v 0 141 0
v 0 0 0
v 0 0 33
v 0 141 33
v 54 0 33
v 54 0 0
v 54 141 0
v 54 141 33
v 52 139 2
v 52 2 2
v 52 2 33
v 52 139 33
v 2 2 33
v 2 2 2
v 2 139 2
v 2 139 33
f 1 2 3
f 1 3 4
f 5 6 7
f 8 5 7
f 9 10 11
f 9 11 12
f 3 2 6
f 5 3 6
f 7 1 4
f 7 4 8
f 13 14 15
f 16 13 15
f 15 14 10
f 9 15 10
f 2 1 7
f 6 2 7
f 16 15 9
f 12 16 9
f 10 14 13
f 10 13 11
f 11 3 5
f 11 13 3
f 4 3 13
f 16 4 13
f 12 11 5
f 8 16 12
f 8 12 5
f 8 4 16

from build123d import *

# Parameters (mm, degrees)
F0_W     = 54
F0_H     = 141
F0_W_2   = 50
F0_H_2   = 137
F1_DEPTH = 33
F2_W     = 54
F2_H     = 2
F3_DEPTH = 141


# Not quite as in the source:
# - the program builds the solid bodies; features that only make, move or delete a surface that nothing else refers to are left out


with BuildPart() as f1:
    # F0 (on Top) → F1 (new body)
    with BuildSketch(Plane.XY):
        with Locations((27, 70.5)):
            Rectangle(F0_W, F0_H)
        with Locations((27, 70.5)):
            Rectangle(F0_W_2, F0_H_2, mode=Mode.SUBTRACT)
    extrude(amount=F1_DEPTH)

    # F2 (on face) → F3 (join)
    with BuildSketch(Plane.XZ):
        with Locations((27, 1)):
            Rectangle(F2_W, F2_H)
    extrude(amount=-F3_DEPTH)


solid = f1.part
